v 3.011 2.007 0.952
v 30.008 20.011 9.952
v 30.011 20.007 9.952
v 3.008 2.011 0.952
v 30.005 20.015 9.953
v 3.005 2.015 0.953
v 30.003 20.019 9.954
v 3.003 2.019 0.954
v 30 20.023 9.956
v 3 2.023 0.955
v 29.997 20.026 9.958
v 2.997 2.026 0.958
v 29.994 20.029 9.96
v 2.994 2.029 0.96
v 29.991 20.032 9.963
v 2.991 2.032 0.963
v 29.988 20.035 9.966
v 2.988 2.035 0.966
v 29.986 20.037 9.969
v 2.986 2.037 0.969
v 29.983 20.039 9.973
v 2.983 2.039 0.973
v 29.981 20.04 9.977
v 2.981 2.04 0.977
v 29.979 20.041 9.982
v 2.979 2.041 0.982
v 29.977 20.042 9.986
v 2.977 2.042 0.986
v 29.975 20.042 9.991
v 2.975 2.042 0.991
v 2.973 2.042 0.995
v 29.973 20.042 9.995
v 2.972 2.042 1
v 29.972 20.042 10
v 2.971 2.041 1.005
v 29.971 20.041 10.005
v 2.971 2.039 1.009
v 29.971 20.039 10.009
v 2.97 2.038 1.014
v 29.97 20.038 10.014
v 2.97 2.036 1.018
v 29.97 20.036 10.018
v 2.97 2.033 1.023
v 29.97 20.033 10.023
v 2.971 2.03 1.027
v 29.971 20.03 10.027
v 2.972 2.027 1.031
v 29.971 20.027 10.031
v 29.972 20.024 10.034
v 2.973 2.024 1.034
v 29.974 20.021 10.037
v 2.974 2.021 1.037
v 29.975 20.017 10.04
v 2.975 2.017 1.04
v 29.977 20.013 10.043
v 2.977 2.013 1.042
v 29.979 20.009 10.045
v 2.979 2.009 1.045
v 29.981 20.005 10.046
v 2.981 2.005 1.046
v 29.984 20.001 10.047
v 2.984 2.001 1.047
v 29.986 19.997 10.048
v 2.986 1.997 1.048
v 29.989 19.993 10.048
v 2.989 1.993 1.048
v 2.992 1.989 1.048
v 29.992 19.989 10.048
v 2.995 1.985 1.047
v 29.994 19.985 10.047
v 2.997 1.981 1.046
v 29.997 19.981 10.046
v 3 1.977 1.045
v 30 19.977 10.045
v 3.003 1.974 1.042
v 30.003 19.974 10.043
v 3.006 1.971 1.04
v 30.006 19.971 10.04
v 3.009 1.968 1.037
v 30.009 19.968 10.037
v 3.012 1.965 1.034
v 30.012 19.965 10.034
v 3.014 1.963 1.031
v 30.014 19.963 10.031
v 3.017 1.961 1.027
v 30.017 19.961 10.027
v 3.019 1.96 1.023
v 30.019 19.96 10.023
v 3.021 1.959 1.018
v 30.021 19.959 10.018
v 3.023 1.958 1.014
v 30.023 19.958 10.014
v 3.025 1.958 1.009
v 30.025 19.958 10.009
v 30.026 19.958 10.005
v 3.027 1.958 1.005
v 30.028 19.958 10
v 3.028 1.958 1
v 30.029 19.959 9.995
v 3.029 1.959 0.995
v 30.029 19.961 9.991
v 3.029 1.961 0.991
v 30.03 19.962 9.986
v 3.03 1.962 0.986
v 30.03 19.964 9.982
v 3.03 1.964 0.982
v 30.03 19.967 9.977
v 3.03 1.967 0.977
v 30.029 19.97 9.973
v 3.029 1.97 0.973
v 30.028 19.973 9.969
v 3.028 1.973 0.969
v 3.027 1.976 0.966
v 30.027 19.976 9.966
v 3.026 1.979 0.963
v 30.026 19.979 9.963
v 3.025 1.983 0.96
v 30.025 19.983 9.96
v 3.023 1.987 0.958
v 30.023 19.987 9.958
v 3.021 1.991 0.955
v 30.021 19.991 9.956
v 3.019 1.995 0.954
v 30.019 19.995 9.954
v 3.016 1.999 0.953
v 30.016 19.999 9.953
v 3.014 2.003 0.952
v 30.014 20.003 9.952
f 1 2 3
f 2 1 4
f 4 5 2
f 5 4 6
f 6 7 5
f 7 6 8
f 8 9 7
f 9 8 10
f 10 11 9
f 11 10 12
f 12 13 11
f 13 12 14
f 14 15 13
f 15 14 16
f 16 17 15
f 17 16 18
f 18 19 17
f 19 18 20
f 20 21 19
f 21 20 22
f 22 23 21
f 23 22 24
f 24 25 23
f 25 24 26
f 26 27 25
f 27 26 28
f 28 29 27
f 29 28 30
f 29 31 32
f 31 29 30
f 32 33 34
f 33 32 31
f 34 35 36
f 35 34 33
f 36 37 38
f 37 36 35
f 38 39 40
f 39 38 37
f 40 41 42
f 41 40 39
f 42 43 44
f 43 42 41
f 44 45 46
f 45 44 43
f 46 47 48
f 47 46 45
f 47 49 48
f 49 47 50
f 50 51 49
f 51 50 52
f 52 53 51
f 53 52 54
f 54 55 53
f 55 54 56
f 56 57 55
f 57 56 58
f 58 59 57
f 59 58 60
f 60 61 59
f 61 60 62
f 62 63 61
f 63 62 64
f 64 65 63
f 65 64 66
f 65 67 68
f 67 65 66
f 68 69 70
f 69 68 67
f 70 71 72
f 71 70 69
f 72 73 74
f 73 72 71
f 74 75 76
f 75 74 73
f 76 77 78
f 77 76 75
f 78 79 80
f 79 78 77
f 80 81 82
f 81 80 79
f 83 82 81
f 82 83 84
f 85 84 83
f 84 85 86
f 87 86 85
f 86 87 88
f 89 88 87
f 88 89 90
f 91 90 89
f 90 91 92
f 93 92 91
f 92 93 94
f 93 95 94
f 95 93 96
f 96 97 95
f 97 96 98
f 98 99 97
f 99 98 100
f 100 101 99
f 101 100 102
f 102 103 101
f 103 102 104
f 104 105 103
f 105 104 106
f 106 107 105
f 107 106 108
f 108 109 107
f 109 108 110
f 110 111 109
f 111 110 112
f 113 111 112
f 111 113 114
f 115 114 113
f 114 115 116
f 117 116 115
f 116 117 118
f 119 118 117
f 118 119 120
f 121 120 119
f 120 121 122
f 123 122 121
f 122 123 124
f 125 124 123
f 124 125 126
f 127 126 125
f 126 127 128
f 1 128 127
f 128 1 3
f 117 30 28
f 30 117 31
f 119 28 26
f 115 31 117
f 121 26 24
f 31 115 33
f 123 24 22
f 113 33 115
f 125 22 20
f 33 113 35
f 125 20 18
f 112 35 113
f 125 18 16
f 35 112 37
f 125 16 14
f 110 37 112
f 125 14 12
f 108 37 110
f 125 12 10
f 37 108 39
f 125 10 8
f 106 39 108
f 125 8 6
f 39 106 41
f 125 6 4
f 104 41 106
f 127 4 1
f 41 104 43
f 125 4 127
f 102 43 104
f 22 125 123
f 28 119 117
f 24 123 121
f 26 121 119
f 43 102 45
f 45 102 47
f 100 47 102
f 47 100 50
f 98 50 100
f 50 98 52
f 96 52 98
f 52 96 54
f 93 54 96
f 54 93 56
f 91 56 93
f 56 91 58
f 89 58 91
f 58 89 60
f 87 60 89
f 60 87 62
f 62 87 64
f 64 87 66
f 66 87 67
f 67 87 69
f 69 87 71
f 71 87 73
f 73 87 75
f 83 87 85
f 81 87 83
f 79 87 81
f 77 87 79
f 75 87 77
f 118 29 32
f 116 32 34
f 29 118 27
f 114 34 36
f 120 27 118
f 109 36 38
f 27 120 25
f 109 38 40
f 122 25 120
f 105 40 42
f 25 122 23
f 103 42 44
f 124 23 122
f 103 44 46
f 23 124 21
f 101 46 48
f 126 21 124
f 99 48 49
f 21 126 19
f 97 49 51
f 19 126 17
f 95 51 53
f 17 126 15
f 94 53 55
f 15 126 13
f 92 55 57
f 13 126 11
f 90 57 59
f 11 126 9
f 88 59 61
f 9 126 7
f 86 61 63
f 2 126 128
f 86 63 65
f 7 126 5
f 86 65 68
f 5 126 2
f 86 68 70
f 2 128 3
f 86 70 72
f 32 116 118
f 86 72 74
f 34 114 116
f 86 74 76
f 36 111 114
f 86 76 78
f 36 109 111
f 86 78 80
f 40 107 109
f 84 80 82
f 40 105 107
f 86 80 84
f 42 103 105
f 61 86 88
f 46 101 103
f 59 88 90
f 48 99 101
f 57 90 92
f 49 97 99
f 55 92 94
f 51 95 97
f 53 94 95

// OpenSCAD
// Unit of length: Unit.MM
union()
{
   translate(v = [3.0, 2.0, 1.0])
   {
      rotate(a = [0.0, 74.4986, 33.6901])
      {
         cylinder(h = 33.6749, d = 0.1, center = false, $fn = 64);
      }
   }
   %union()
   {
      translate(v = [3.0, 2.0, 1.0])
      {
         cube(size = [27.0, 18.0, 9.0], center = false);
      }
   }
}
